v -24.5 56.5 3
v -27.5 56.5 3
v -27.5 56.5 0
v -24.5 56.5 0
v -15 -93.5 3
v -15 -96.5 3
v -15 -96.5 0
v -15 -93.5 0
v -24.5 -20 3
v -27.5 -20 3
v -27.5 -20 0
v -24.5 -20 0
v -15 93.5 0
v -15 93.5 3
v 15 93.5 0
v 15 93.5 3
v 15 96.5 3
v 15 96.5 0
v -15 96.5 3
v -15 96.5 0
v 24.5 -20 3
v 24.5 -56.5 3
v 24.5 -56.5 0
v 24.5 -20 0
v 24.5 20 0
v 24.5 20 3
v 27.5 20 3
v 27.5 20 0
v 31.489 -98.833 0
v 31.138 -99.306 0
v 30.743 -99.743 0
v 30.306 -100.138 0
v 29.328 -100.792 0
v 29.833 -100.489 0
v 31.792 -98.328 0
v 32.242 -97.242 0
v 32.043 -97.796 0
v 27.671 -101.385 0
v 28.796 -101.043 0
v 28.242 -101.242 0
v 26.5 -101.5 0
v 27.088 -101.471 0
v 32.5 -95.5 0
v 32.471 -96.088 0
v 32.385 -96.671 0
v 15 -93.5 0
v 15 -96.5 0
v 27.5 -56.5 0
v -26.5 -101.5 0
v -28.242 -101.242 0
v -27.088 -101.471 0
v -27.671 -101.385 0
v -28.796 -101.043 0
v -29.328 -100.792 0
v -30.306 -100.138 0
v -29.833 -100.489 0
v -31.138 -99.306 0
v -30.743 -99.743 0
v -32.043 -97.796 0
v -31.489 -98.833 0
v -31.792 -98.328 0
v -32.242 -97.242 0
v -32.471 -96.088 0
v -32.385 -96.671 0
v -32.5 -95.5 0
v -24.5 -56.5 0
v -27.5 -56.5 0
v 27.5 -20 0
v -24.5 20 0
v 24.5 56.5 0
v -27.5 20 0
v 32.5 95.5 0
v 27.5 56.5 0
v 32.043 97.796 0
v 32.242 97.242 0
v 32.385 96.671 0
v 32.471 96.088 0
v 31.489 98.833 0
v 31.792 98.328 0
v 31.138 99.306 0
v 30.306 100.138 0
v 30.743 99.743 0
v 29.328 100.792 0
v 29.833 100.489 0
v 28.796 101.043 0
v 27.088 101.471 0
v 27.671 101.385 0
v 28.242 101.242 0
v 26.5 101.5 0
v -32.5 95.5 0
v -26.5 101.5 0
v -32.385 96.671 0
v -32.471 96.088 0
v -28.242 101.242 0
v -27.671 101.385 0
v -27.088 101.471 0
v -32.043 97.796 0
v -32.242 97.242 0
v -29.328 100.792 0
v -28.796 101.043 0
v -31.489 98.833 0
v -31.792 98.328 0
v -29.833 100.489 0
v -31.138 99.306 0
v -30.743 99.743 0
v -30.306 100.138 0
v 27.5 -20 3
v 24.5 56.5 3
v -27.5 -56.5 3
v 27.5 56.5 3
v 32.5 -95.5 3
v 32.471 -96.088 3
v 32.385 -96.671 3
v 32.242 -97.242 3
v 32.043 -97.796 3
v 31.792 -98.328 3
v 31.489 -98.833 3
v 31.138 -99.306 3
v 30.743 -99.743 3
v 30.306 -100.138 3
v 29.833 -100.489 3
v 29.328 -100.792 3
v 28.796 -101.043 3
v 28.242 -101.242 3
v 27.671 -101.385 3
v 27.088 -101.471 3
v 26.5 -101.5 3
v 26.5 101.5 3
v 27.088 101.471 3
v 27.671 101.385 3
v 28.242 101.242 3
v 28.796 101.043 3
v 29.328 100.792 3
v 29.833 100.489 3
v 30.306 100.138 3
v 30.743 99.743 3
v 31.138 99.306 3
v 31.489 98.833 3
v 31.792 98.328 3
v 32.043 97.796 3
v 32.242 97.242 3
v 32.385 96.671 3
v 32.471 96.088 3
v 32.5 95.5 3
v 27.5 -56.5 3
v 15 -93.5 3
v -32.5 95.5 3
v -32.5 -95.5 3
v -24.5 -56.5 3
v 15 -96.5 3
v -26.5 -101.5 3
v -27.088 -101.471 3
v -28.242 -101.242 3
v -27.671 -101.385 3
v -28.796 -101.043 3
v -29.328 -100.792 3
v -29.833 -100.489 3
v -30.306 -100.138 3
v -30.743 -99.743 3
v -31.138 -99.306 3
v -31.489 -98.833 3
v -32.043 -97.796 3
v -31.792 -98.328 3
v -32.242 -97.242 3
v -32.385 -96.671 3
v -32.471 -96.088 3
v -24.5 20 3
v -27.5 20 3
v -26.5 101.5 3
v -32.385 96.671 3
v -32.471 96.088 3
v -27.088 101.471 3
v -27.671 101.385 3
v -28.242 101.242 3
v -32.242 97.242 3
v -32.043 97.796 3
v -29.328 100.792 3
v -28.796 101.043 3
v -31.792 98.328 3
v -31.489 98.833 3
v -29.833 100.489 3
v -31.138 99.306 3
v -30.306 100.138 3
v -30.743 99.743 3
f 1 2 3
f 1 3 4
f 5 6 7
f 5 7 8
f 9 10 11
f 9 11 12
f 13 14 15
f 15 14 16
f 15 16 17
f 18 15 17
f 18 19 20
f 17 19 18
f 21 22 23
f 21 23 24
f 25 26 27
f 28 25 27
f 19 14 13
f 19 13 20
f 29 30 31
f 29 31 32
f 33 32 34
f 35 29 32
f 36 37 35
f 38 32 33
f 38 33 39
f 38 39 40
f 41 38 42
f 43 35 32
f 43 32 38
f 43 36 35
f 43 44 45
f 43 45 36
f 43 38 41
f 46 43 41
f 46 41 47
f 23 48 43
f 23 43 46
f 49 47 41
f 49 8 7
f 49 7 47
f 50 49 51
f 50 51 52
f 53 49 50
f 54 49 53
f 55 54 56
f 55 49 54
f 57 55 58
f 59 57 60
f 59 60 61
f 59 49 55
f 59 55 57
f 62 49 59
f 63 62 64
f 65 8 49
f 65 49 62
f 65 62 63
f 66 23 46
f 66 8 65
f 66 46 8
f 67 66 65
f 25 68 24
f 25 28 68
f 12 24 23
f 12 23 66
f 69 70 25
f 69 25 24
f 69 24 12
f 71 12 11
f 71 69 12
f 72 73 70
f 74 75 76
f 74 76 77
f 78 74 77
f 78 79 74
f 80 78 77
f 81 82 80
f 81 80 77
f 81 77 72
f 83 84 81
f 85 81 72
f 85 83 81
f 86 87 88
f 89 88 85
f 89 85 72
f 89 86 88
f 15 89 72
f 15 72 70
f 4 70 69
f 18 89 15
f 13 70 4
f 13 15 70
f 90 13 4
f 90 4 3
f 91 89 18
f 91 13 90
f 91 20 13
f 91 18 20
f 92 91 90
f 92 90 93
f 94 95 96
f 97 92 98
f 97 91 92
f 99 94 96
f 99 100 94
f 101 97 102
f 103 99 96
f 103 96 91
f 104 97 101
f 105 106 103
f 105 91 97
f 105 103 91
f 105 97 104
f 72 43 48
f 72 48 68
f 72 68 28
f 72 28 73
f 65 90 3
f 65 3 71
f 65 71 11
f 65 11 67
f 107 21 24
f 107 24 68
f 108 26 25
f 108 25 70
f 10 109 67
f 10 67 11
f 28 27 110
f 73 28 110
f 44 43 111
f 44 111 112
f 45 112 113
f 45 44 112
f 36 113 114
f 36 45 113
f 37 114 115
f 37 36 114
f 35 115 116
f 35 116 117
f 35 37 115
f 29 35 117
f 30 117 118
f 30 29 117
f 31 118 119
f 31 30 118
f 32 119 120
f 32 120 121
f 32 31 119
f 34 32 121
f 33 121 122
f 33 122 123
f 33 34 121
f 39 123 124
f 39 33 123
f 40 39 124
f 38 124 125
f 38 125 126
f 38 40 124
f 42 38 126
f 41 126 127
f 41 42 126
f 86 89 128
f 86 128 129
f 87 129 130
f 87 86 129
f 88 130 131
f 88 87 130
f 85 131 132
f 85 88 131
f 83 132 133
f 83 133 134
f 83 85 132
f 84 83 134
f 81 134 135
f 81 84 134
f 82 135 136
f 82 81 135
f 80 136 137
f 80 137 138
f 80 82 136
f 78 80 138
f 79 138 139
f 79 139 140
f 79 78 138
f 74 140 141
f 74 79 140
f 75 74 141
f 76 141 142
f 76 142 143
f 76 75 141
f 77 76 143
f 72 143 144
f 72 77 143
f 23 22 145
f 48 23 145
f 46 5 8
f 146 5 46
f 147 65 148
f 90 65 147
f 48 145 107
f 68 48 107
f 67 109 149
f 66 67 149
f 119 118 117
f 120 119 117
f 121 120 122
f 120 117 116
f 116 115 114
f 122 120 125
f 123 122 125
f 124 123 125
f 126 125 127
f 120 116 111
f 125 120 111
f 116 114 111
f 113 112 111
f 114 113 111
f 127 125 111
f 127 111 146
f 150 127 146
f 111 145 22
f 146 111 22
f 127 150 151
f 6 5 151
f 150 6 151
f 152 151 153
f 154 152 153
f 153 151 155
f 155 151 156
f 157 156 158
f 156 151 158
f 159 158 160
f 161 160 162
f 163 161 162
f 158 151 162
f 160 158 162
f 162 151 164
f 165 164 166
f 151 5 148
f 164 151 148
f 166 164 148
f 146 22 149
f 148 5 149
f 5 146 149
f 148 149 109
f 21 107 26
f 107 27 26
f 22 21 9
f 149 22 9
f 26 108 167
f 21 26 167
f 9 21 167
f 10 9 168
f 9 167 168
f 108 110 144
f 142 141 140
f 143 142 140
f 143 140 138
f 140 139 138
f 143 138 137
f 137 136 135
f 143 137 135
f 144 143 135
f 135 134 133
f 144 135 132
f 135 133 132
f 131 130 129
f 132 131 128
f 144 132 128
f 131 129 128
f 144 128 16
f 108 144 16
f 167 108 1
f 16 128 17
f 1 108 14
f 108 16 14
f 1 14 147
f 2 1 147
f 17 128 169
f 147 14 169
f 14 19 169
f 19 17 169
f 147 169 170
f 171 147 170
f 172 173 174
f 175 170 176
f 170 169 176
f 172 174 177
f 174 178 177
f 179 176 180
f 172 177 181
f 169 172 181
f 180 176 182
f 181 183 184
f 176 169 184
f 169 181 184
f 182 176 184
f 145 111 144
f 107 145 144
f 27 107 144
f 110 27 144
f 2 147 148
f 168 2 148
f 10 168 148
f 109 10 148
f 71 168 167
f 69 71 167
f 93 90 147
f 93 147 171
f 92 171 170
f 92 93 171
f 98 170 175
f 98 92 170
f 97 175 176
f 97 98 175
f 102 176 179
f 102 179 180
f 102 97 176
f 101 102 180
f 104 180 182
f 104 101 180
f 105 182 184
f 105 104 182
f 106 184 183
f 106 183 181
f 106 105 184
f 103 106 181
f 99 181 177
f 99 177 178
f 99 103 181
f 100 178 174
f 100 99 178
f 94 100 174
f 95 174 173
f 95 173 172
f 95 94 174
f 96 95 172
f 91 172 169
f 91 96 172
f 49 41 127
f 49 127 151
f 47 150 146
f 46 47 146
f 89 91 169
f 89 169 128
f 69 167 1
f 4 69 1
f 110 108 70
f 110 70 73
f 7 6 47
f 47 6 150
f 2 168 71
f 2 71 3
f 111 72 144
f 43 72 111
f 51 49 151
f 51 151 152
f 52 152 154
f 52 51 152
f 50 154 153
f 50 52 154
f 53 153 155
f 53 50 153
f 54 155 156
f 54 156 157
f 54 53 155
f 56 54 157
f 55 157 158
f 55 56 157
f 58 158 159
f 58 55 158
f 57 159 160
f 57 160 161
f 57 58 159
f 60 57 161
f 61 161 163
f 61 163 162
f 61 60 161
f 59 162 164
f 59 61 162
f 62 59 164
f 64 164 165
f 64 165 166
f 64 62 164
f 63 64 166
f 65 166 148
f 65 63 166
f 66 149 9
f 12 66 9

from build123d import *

# Parameters (mm, degrees)
BOSS_EXTRUDE1_DEPTH = 3
SKETCH2_W           = 3
SKETCH2_H           = 36.5
SKETCH2_W_2         = 30
SKETCH2_H_2         = 3
CUT_EXTRUDE1_DEPTH  = 3


with BuildPart() as part:
    # Sketch1 → Boss-Extrude1 (new body)
    with BuildSketch(Plane.XY):
        with BuildLine():
            Line((-26.5, 101.5), (26.5, 101.5))
            ThreePointArc((26.5, 101.5), (30.742640687, 99.742640687), (32.5, 95.5))
            Line((32.5, 95.5), (32.5, -95.5))
            ThreePointArc((32.5, -95.5), (30.742640687, -99.742640687), (26.5, -101.5))
            Line((26.5, -101.5), (-26.5, -101.5))
            ThreePointArc((-26.5, -101.5), (-30.742640687, -99.742640687), (-32.5, -95.5))
            Line((-32.5, -95.5), (-32.5, 95.5))
            ThreePointArc((-32.5, 95.5), (-30.742640687, 99.742640687), (-26.5, 101.5))
        make_face()
    extrude(amount=BOSS_EXTRUDE1_DEPTH)

    # Sketch2 → Cut-Extrude1 (cut)
    with BuildSketch(Plane.XY.offset(3)):
        with Locations((26, -38.25)):
            Rectangle(SKETCH2_W, SKETCH2_H)
        with Locations((0, 95)):
            Rectangle(SKETCH2_W_2, SKETCH2_H_2)
        with Locations((26, 38.25)):
            Rectangle(SKETCH2_W, SKETCH2_H)
        with Locations((0, -95)):
            Rectangle(SKETCH2_W_2, SKETCH2_H_2)
        with Locations((-26, 38.25)):
            Rectangle(SKETCH2_W, SKETCH2_H)
        with Locations((-26, -38.25)):
            Rectangle(SKETCH2_W, SKETCH2_H)
    extrude(amount=-CUT_EXTRUDE1_DEPTH, mode=Mode.SUBTRACT)


solid = part.part
